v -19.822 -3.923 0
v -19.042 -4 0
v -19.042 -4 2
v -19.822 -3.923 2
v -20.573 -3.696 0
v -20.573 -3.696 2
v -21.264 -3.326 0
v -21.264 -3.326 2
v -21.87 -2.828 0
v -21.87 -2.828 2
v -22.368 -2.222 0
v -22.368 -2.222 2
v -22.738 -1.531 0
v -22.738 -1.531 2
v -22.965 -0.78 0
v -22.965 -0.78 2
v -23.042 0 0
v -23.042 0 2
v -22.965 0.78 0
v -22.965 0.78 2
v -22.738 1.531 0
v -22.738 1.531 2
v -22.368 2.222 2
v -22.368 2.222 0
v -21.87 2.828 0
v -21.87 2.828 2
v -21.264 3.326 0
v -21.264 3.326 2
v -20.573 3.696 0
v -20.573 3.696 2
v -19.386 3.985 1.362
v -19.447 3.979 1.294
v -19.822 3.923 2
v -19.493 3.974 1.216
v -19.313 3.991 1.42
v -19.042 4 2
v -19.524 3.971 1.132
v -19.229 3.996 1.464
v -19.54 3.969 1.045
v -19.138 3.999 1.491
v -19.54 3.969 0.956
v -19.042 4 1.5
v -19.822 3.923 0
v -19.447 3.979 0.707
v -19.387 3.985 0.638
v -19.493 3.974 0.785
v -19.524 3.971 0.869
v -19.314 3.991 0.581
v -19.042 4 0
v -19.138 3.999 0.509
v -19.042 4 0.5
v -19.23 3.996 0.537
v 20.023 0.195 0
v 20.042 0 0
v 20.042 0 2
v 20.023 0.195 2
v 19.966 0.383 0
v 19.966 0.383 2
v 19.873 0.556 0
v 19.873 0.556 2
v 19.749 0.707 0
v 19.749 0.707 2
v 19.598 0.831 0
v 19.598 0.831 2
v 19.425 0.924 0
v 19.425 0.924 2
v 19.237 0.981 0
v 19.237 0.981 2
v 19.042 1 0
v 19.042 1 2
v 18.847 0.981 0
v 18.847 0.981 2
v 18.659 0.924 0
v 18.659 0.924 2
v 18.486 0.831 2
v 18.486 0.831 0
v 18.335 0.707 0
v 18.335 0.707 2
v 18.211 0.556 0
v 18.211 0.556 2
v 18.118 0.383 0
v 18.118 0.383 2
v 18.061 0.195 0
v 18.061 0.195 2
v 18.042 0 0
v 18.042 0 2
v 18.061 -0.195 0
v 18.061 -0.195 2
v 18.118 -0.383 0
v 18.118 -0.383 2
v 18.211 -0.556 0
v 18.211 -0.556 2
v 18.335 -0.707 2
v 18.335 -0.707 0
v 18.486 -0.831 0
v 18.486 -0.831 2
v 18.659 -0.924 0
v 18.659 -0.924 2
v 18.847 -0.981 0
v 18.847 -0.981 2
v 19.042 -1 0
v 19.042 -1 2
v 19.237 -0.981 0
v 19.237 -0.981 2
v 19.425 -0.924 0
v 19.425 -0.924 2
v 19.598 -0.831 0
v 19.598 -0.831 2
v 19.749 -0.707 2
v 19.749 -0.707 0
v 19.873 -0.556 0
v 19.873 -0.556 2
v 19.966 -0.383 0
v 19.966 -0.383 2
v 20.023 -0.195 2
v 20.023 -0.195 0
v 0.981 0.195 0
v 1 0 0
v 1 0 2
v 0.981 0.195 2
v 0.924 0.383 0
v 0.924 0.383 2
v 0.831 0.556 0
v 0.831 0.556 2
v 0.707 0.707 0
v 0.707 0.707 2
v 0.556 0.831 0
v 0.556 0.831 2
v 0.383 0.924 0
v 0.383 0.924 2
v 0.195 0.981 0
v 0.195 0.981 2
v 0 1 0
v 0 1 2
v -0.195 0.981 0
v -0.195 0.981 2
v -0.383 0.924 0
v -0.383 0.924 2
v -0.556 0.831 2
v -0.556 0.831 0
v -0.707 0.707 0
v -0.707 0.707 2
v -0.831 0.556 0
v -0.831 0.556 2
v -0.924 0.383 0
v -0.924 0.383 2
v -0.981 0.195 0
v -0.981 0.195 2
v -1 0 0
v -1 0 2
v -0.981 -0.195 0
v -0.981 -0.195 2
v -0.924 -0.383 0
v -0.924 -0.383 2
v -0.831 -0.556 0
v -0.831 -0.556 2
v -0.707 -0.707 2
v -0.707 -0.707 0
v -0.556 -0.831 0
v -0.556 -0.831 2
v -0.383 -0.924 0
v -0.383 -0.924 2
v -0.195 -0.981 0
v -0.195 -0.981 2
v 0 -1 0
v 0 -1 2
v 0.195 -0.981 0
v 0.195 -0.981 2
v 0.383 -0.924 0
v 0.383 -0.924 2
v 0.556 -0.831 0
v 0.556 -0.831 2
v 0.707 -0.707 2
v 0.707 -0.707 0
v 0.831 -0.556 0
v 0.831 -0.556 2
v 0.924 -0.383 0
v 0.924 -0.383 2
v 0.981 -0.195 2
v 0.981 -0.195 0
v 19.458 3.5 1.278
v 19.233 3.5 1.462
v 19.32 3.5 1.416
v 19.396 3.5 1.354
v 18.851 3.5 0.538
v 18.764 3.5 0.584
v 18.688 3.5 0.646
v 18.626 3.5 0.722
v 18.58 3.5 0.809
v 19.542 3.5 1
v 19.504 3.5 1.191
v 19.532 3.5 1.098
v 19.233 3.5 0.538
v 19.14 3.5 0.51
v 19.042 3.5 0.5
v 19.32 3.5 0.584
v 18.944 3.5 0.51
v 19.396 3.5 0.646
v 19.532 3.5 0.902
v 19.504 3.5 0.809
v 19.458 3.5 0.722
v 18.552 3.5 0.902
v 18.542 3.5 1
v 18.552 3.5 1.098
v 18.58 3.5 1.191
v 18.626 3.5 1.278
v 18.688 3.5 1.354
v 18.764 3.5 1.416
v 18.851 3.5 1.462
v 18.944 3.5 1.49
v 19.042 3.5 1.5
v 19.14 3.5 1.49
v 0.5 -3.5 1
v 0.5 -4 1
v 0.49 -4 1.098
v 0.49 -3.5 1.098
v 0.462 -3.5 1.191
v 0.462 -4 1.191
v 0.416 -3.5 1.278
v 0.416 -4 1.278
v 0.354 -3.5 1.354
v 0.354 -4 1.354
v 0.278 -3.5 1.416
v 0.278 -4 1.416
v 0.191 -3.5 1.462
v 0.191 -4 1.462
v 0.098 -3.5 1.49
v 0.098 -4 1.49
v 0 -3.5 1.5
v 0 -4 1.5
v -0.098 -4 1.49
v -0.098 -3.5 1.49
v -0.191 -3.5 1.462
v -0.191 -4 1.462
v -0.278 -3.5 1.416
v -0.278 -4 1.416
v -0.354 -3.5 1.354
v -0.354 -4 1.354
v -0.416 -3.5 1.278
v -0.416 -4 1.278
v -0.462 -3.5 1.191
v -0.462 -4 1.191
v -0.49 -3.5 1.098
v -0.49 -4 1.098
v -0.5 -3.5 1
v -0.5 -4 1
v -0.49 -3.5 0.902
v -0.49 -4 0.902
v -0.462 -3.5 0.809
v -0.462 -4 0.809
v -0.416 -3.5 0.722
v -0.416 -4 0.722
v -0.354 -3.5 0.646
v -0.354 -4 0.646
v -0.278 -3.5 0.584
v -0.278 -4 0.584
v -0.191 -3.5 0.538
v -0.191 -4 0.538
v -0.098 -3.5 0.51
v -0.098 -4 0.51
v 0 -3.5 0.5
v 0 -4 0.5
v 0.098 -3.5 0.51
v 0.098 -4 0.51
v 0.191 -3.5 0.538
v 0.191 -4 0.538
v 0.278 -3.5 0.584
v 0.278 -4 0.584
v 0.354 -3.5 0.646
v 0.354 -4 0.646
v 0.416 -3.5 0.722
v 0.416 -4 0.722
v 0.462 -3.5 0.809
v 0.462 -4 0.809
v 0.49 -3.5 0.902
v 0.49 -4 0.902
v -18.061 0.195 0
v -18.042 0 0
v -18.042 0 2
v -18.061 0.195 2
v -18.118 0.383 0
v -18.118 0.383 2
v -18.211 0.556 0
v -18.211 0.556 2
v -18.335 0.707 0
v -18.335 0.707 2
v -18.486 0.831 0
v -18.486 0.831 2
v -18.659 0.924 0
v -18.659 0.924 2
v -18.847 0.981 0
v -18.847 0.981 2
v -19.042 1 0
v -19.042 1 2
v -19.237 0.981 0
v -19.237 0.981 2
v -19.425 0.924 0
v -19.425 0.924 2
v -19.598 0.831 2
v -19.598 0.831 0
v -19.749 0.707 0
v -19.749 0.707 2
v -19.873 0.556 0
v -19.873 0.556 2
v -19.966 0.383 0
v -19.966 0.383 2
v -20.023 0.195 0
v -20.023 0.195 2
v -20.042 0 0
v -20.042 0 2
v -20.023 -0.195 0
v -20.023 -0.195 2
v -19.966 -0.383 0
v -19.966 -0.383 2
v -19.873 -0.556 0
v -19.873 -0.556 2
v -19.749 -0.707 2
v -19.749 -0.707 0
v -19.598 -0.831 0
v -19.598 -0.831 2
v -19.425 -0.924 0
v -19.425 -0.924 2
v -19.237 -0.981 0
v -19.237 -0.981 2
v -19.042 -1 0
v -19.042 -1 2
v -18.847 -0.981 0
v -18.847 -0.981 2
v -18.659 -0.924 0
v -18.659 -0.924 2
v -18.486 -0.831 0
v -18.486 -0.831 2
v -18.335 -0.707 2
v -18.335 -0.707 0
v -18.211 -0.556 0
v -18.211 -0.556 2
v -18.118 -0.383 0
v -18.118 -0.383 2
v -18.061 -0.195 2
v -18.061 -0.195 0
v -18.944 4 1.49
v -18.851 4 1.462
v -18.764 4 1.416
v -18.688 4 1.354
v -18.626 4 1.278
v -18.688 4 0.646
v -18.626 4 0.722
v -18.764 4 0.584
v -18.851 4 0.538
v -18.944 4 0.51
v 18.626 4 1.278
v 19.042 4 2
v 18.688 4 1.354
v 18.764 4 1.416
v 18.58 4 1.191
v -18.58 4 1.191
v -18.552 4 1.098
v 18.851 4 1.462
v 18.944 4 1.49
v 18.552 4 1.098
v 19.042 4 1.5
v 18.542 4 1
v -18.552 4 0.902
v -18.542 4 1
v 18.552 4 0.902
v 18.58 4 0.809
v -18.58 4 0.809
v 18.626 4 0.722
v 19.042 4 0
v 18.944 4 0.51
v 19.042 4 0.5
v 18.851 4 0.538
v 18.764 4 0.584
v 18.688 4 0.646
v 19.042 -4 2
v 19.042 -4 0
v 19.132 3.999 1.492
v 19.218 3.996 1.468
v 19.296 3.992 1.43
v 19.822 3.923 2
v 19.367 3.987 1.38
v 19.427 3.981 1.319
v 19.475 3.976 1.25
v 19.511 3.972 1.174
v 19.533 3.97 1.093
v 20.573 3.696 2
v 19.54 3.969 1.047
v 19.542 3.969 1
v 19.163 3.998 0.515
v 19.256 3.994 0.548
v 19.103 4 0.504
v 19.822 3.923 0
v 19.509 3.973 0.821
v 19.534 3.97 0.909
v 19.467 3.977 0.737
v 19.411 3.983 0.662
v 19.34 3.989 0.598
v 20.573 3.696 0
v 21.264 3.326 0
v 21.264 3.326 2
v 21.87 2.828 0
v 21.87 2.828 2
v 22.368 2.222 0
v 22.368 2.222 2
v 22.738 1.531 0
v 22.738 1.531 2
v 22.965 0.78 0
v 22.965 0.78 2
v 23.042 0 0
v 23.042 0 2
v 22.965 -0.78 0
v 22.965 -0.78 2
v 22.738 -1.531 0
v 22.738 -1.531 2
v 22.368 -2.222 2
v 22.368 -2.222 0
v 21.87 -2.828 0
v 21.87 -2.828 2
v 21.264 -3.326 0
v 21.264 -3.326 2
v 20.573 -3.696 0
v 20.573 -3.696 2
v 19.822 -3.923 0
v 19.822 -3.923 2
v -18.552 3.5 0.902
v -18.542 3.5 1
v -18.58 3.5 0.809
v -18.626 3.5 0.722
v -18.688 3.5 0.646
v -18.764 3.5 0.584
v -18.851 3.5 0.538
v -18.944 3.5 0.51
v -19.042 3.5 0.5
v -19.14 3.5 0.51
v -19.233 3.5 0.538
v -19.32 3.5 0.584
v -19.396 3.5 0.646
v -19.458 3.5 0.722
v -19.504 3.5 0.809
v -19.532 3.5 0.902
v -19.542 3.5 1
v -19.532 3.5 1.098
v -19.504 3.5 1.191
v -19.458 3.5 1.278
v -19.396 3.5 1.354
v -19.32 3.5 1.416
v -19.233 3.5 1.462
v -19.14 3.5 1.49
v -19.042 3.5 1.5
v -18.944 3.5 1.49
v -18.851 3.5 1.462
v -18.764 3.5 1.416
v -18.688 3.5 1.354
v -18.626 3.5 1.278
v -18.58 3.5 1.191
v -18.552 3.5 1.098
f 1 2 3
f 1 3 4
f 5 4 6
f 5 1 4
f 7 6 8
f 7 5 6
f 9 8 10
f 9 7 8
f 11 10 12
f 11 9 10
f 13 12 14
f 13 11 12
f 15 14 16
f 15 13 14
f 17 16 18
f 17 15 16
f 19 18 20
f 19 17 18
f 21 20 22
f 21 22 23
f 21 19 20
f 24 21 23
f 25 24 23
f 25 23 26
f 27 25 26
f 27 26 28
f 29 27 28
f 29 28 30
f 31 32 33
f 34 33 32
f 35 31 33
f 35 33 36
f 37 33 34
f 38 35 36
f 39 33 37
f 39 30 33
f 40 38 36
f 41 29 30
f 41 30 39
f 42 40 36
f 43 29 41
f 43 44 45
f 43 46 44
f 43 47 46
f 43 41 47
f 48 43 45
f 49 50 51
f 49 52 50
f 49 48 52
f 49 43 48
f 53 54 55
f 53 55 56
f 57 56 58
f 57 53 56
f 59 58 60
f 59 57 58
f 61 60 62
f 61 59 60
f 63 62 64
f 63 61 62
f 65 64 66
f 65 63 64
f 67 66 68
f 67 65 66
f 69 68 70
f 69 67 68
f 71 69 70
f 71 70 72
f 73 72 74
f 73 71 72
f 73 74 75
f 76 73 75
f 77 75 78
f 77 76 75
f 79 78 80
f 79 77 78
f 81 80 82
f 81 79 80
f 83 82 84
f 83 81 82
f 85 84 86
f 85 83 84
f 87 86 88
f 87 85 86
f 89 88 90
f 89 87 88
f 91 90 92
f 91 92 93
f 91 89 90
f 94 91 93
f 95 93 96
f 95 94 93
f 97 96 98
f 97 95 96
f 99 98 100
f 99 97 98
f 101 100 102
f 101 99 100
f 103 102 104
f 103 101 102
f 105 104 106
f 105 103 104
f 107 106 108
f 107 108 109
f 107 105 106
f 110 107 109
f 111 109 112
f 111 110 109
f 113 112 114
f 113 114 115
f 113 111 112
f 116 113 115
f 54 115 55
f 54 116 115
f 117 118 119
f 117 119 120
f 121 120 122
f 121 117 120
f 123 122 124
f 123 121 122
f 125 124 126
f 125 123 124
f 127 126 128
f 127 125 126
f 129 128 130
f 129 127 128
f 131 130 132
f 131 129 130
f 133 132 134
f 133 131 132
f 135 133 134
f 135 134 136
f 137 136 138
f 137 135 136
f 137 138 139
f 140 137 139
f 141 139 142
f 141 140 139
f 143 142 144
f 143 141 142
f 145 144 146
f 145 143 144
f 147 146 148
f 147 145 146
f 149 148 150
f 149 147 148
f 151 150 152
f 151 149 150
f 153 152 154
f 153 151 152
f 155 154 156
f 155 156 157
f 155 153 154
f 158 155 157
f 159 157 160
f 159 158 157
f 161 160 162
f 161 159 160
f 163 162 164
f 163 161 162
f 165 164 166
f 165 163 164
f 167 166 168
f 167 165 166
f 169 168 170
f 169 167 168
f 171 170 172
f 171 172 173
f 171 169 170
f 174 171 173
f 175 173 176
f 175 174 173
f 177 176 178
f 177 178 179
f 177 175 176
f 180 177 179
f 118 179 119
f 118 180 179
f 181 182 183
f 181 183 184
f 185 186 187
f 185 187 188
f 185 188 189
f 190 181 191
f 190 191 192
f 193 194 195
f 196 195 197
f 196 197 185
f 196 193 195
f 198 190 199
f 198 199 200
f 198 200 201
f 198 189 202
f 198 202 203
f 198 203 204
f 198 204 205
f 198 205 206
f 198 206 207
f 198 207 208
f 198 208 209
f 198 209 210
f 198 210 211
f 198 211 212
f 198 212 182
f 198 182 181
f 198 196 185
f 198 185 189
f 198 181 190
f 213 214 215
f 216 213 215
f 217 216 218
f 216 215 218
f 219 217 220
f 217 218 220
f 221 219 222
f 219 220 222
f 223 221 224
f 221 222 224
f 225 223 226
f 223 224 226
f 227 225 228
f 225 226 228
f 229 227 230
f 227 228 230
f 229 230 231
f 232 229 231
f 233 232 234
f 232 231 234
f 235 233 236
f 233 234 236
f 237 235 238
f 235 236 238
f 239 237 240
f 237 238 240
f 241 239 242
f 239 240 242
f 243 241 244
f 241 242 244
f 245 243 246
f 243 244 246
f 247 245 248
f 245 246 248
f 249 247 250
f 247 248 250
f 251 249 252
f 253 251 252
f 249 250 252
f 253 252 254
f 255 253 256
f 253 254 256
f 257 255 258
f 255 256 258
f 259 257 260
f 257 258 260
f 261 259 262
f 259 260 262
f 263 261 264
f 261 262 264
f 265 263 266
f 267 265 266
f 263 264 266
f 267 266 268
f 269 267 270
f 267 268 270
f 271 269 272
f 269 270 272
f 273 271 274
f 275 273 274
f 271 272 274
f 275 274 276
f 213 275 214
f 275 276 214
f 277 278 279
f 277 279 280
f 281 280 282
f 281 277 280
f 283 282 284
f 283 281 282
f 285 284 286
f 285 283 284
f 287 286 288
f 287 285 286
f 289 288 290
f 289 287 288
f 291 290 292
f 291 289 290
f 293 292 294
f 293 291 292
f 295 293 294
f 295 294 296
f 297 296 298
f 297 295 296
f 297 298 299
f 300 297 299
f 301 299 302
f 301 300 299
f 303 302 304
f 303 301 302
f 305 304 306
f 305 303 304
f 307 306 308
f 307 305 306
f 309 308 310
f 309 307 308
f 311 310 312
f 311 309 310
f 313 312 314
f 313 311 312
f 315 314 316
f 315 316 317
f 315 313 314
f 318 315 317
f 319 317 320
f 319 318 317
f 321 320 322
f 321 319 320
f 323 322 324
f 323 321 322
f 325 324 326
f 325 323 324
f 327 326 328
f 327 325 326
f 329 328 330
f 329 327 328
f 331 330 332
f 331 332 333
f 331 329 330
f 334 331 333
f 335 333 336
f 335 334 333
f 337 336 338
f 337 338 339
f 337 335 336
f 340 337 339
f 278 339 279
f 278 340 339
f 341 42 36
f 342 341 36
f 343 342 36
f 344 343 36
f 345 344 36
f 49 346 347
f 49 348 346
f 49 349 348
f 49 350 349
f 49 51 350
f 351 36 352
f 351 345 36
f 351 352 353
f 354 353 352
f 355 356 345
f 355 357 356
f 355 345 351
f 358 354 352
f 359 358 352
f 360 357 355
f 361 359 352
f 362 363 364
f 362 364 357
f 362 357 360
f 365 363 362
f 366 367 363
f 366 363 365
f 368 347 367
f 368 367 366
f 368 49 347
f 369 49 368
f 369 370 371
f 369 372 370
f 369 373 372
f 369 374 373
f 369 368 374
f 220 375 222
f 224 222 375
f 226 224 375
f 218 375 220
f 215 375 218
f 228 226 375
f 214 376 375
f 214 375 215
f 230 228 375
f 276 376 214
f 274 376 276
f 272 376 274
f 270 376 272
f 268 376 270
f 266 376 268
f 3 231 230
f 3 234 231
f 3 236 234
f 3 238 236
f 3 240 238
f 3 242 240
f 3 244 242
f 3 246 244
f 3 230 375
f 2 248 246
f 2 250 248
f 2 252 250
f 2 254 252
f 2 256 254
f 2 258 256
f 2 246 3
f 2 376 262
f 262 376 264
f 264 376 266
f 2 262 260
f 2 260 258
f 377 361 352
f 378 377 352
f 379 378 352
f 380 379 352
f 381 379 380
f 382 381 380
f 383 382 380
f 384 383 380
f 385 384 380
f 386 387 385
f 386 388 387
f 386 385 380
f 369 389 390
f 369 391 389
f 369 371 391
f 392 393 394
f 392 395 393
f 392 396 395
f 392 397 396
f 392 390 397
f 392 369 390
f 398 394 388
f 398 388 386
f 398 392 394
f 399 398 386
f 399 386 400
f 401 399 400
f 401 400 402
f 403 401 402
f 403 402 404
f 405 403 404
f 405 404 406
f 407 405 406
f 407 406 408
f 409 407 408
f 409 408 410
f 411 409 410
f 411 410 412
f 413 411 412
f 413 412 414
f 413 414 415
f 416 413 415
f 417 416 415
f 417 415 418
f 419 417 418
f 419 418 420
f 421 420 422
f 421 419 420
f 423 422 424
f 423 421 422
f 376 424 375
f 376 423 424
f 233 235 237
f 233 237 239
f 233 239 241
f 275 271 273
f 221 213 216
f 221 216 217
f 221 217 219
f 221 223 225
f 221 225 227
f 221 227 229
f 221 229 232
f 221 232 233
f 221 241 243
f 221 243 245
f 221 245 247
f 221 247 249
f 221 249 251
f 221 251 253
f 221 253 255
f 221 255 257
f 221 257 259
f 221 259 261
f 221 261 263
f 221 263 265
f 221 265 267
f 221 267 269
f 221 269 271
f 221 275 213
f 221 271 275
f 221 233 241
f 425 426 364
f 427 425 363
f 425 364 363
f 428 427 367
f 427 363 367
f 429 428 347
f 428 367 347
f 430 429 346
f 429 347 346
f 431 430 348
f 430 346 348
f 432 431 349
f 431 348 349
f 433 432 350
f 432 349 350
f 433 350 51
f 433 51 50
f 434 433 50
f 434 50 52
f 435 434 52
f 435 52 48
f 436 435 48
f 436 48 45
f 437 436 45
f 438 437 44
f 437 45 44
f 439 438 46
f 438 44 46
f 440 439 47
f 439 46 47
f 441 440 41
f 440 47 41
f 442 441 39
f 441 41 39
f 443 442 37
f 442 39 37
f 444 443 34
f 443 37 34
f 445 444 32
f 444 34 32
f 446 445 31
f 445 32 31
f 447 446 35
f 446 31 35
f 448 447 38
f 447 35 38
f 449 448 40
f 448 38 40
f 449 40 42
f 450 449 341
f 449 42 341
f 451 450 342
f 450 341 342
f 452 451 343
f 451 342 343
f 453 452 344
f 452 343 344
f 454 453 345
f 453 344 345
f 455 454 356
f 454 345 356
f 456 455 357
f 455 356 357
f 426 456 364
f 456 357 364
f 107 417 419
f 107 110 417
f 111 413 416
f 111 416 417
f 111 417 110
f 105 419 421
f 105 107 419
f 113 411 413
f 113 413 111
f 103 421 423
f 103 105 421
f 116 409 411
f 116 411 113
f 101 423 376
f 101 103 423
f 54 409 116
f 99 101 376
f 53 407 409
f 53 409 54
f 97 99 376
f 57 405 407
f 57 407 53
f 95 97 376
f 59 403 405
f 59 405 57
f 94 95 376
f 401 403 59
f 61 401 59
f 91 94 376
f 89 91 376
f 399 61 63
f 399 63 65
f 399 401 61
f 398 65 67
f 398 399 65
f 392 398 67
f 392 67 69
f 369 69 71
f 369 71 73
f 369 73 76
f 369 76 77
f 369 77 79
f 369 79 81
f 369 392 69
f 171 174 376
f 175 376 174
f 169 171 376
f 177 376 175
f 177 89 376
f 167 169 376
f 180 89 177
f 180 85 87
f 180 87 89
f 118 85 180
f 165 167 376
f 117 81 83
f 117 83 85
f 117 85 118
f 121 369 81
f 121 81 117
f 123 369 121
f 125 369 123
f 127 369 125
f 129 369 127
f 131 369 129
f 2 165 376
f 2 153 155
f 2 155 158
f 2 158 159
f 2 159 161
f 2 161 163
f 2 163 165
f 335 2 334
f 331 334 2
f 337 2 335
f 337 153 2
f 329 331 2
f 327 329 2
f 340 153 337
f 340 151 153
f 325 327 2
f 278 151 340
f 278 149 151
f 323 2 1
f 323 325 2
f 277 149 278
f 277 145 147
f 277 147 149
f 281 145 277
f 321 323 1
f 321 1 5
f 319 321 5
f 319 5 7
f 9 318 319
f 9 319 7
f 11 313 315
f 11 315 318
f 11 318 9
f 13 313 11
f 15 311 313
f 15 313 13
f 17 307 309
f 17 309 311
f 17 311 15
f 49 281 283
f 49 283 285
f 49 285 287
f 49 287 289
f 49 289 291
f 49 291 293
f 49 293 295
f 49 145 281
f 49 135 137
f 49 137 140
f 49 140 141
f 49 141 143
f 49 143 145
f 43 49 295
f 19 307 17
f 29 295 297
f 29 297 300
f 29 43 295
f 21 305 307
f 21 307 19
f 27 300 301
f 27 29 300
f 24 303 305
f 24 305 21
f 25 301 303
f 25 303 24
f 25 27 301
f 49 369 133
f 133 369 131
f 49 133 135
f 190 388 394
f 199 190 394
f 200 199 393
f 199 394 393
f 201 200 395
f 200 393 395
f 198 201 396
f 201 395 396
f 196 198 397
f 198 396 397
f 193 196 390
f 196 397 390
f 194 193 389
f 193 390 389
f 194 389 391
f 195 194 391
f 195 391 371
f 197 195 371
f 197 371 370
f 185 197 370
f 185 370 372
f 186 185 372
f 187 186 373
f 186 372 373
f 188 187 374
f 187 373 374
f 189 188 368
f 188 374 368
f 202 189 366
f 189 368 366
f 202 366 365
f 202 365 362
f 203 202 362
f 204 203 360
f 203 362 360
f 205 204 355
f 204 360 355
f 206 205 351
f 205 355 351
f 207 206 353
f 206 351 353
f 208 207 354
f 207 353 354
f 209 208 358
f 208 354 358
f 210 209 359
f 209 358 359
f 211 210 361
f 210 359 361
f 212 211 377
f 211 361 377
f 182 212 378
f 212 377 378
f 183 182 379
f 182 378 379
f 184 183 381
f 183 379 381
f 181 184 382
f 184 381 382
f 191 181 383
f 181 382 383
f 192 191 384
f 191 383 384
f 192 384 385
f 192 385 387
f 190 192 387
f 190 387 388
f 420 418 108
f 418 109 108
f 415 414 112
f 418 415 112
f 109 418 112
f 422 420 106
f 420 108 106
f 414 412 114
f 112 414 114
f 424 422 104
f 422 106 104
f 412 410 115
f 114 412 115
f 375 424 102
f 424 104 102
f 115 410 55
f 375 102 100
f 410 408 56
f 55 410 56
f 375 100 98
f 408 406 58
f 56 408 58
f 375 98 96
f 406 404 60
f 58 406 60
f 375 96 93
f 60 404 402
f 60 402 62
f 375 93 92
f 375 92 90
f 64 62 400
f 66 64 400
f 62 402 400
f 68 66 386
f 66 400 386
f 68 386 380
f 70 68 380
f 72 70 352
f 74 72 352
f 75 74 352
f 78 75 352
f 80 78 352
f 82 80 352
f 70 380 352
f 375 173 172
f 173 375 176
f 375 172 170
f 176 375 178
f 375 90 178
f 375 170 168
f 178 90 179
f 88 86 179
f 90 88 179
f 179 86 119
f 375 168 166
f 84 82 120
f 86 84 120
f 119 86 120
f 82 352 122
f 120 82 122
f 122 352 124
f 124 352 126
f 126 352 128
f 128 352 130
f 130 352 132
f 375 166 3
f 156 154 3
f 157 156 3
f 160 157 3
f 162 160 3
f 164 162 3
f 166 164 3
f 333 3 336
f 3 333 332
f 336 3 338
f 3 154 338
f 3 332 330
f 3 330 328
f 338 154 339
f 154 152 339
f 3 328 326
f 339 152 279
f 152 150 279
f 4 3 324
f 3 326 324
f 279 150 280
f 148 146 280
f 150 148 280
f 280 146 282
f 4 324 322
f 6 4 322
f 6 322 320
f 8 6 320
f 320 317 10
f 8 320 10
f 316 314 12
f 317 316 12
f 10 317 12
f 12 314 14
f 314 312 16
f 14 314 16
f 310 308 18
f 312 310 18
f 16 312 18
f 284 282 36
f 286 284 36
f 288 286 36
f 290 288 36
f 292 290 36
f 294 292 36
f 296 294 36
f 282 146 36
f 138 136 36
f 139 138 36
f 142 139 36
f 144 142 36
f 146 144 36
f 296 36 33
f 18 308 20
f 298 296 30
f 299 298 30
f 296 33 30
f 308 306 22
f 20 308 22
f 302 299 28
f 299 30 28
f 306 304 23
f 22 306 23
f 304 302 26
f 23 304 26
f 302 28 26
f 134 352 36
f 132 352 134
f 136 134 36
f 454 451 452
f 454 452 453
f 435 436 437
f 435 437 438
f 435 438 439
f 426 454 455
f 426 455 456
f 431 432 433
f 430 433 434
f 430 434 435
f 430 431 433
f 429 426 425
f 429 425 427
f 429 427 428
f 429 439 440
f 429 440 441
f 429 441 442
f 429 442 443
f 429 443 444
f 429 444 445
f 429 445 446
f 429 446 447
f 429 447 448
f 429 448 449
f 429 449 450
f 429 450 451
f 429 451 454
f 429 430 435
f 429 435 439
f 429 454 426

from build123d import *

# Parameters (mm, degrees)
SKETCH1_R           = 1
BOSS_EXTRUDE1_DEPTH = 2
SKETCH2_R           = 0.5
CUT_EXTRUDE1_DEPTH  = 0.5
SKETCH3_R           = 0.5
CUT_EXTRUDE2_DEPTH  = 0.5


with BuildPart() as part:
    # Sketch1 → Boss-Extrude1 (new body)
    with BuildSketch(Plane.XY):
        with BuildLine():
            Line((-19.041986571, 4), (19.041986571, 4))
            ThreePointArc((19.041986571, 4), (23.041986571, 0), (19.041986571, -4))
            Line((19.041986571, -4), (-19.041986571, -4))
            ThreePointArc((-19.041986571, -4), (-23.041986571, 0), (-19.041986571, 4))
        make_face()
        Circle(SKETCH1_R, mode=Mode.SUBTRACT)
        with Locations((19.041986571, 0)):
            Circle(SKETCH1_R, mode=Mode.SUBTRACT)
        with Locations((-19.041986571, 0)):
            Circle(SKETCH1_R, mode=Mode.SUBTRACT)
    extrude(amount=BOSS_EXTRUDE1_DEPTH)

    # Sketch2 → Cut-Extrude1 (cut)
    with BuildSketch(Plane(origin=(0, 4, 0), x_dir=(1, 0, 0), z_dir=(0, 1, 0))):
        with Locations((-19.041986571, -1)):
            Circle(SKETCH2_R)
        with Locations((19.041986571, -1)):
            Circle(SKETCH2_R)
    extrude(amount=-CUT_EXTRUDE1_DEPTH, mode=Mode.SUBTRACT)

    # Sketch3 → Cut-Extrude2 (cut)
    with BuildSketch(Plane.XZ.offset(4)):
        with Locations((0, 1)):
            Circle(SKETCH3_R)
    extrude(amount=-CUT_EXTRUDE2_DEPTH, mode=Mode.SUBTRACT)


solid = part.part
